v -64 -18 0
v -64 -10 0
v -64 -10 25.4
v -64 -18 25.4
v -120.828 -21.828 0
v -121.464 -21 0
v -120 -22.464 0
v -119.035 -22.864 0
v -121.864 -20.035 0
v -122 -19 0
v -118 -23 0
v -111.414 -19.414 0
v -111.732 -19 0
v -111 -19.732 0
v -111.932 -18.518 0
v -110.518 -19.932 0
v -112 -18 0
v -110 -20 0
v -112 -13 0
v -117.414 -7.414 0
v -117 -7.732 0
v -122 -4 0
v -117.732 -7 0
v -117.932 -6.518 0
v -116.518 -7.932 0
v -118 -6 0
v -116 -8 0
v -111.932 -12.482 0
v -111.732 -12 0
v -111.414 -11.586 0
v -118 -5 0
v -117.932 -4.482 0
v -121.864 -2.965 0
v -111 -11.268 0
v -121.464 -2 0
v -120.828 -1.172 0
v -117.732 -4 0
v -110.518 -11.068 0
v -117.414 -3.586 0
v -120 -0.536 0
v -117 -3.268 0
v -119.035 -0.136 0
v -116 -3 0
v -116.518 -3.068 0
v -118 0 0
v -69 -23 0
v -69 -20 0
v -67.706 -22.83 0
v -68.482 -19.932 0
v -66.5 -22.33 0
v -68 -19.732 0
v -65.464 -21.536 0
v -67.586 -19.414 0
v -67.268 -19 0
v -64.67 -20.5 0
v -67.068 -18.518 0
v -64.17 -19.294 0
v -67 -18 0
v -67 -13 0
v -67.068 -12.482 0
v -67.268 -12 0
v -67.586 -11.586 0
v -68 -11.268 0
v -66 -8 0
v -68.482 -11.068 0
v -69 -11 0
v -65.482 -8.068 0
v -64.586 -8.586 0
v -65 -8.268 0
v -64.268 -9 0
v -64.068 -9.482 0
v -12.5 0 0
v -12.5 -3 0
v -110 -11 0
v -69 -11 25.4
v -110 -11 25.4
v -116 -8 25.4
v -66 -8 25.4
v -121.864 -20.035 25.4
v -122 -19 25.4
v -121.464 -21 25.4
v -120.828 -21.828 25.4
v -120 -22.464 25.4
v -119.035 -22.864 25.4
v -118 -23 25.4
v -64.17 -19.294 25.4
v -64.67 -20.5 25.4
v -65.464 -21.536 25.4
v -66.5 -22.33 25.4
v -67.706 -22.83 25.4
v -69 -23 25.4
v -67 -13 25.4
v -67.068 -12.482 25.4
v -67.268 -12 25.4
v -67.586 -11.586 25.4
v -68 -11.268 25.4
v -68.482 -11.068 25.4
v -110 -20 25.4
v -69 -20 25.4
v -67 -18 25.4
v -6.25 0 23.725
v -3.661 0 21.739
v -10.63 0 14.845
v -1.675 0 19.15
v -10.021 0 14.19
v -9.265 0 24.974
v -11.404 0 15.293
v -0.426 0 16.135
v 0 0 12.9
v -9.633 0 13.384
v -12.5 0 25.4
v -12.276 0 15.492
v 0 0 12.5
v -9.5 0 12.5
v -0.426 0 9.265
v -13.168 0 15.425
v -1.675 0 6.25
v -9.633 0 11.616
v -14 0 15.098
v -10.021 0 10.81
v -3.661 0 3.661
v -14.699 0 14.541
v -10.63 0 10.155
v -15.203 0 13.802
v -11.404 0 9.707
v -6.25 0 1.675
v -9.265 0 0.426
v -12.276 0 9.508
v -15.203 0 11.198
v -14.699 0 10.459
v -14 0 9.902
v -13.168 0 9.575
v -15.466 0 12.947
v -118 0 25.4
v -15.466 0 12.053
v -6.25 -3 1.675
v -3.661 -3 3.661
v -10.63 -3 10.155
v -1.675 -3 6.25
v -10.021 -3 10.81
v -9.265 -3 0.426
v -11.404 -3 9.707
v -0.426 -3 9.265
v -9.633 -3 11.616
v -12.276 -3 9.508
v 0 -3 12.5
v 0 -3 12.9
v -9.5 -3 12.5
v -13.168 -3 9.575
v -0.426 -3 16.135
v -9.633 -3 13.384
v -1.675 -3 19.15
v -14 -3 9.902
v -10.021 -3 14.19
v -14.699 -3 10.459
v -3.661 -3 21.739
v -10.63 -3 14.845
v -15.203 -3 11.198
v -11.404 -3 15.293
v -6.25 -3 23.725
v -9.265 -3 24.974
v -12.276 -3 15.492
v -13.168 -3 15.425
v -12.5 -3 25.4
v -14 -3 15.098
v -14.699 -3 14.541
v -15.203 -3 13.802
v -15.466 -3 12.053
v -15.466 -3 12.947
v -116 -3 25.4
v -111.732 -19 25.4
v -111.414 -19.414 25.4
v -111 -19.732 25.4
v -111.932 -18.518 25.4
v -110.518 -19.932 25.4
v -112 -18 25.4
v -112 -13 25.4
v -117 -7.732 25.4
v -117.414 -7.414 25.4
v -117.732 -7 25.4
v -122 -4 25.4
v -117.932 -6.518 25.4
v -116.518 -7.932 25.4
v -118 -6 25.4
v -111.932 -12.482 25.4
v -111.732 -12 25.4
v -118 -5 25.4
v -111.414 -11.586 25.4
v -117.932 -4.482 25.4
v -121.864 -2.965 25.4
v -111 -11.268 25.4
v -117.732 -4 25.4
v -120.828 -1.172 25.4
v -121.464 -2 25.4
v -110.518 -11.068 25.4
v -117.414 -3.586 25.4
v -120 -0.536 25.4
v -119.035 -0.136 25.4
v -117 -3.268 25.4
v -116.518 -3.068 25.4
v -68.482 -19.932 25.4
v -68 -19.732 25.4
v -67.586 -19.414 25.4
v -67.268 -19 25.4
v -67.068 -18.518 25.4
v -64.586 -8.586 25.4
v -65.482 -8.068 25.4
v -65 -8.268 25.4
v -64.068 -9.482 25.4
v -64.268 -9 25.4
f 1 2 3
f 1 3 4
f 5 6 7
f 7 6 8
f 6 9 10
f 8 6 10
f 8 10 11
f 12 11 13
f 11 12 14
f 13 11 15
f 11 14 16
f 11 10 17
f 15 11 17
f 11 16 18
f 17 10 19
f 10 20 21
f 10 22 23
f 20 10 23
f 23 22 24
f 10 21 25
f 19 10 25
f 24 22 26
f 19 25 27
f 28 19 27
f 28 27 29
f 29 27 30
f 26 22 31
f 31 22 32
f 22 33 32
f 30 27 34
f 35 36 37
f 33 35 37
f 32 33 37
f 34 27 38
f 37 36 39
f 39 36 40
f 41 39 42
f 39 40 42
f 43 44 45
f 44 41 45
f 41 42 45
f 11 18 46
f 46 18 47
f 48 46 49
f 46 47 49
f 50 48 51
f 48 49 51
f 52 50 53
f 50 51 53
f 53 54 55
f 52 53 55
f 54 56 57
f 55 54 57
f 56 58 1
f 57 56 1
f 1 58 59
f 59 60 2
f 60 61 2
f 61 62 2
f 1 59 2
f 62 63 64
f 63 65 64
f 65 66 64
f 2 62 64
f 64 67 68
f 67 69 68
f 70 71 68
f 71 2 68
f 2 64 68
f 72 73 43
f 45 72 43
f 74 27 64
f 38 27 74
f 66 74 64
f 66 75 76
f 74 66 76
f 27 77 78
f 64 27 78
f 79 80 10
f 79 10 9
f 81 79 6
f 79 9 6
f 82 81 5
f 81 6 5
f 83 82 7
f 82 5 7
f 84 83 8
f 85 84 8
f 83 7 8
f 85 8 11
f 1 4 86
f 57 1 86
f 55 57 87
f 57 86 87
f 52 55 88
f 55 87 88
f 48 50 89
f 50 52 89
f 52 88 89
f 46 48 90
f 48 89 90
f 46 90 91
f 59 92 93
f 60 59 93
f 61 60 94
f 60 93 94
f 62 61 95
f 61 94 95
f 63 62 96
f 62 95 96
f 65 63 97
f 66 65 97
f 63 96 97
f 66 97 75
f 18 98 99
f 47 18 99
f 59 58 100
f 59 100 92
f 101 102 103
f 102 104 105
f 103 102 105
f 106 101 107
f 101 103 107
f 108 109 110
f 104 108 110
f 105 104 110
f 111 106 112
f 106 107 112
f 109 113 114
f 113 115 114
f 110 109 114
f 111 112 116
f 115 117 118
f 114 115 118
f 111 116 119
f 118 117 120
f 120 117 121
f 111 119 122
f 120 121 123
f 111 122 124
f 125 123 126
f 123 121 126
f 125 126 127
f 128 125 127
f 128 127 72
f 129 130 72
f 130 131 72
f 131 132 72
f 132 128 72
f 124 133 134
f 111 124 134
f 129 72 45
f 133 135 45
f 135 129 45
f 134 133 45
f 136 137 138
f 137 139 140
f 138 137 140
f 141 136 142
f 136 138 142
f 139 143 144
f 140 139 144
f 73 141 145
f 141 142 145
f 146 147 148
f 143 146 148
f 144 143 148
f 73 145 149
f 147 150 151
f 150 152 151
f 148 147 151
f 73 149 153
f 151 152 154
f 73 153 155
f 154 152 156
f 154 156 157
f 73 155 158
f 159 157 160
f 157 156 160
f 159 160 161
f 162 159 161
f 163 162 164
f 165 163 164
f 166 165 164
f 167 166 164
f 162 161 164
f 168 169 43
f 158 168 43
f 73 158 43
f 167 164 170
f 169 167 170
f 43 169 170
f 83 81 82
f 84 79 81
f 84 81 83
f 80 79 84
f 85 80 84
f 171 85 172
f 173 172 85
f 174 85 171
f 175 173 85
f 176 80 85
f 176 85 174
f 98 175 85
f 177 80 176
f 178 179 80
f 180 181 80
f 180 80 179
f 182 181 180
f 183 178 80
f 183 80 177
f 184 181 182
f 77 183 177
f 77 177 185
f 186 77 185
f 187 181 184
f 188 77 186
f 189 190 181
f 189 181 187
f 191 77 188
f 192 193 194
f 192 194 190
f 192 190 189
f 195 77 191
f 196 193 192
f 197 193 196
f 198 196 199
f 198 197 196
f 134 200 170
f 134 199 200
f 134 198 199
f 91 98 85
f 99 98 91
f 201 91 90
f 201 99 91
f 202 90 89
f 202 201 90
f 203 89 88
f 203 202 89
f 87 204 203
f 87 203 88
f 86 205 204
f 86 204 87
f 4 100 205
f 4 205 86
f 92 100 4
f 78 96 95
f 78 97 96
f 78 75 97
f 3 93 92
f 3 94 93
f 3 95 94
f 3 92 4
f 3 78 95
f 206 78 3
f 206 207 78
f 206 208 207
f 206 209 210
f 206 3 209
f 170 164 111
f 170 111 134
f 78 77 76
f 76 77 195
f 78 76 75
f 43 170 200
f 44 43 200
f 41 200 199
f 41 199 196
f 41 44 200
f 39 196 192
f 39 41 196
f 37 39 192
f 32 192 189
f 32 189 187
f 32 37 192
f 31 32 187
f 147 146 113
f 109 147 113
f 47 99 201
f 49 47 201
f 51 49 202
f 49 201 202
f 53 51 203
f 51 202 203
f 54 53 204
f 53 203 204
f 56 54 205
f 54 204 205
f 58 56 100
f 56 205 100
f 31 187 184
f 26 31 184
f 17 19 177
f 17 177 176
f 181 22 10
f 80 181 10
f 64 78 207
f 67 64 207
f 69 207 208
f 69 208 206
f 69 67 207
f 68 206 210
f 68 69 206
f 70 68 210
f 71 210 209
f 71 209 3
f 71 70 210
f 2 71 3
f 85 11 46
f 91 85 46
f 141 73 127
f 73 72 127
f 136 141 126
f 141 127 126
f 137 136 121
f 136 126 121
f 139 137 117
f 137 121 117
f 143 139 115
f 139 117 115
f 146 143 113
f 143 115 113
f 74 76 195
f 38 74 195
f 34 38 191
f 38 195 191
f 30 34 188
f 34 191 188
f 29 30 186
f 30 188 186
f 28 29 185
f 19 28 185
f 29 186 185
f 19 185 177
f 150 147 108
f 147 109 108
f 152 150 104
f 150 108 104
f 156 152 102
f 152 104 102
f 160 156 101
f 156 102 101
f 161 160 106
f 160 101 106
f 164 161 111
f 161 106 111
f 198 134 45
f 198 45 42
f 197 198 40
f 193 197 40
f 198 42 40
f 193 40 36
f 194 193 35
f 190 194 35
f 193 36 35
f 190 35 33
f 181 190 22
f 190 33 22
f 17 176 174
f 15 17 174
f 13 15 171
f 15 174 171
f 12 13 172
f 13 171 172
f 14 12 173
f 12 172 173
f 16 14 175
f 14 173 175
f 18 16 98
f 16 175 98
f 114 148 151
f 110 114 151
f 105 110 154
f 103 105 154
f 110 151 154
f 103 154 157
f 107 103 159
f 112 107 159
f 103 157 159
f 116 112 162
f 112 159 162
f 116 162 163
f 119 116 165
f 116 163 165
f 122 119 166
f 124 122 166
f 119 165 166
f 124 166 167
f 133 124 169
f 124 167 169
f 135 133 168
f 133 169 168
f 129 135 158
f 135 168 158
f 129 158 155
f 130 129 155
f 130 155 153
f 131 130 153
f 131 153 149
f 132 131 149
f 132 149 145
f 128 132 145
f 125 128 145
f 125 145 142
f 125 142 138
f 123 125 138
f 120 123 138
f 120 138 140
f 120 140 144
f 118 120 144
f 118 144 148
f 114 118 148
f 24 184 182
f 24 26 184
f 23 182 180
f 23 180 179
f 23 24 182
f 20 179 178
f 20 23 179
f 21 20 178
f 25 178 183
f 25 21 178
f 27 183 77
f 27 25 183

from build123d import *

# Parameters (mm, degrees)
F1_DEPTH = 25.4
F3_DEPTH = 25.401
F5_DEPTH = 25.401
F6_R     = 2
F7_R     = 12.5
F8_R     = 3
F9_DEPTH = 3.001


with BuildPart() as f1:
    # F0 (on Top) → F1 (new body)
    with BuildSketch(Plane.XY):
        with BuildLine():
            Line((0, -23), (0, 0))
            Line((0, 0), (-118, 0))
            ThreePointArc((-118, 0), (-120.828427, -1.171573), (-122, -4))
            Line((-122, -4), (-122, -19))
            ThreePointArc((-122, -19), (-120.828427, -21.828427), (-118, -23))
            Line((-118, -23), (0, -23))
        make_face()
    extrude(amount=F1_DEPTH)

    # F2 (on face) → F3 (cut, through all)
    with BuildSketch(Plane.XY.offset(25.4)):
        with BuildLine():
            Line((-69, -11), (-110, -11))
            ThreePointArc((-110, -11), (-111.414214, -11.585786), (-112, -13))
            Line((-112, -13), (-112, -18))
            ThreePointArc((-112, -18), (-111.414214, -19.414214), (-110, -20))
            Line((-110, -20), (-69, -20))
            ThreePointArc((-69, -20), (-67.585786, -19.414214), (-67, -18))
            Line((-67, -18), (-67, -13))
            ThreePointArc((-67, -13), (-67.585786, -11.585786), (-69, -11))
        make_face()
    extrude(amount=-F3_DEPTH, mode=Mode.SUBTRACT)

    # F4 (on face) → F5 (cut, through all)
    with BuildSketch(Plane.XY.offset(25.4)):
        with BuildLine():
            Line((-118, -8), (-64, -8))
            Line((-64, -8), (-64, -18))
            ThreePointArc((-64, -18), (-65.464466, -21.535534), (-69, -23))
            Line((-69, -23), (0, -23))
            Line((0, -23), (0, -3))
            Line((0, -3), (-118, -3))
            Line((-118, -3), (-118, -8))
        make_face()
    extrude(amount=-F5_DEPTH, mode=Mode.SUBTRACT)

    # F6
    f6_edges = [f1.edges().sort_by_distance(p)[0] for p in [
        (-118, -3, 12.7),
        (-118, -8, 12.7),
        (-64, -8, 12.7),
    ]]
    fillet(f6_edges, radius=F6_R)

    # F7
    f7_edges = [f1.edges().sort_by_distance(p)[0] for p in [
        (0, -1.5, 25.4),
        (0, -1.5, 0),
    ]]
    fillet(f7_edges, radius=F7_R)

    # F8 (on face) → F9 (cut, through all)
    with BuildSketch(Plane.XZ.offset(3)):
        with Locations((-12.5, 12.5)):
            Circle(F8_R)
    extrude(amount=-F9_DEPTH, mode=Mode.SUBTRACT)


solid = f1.part
